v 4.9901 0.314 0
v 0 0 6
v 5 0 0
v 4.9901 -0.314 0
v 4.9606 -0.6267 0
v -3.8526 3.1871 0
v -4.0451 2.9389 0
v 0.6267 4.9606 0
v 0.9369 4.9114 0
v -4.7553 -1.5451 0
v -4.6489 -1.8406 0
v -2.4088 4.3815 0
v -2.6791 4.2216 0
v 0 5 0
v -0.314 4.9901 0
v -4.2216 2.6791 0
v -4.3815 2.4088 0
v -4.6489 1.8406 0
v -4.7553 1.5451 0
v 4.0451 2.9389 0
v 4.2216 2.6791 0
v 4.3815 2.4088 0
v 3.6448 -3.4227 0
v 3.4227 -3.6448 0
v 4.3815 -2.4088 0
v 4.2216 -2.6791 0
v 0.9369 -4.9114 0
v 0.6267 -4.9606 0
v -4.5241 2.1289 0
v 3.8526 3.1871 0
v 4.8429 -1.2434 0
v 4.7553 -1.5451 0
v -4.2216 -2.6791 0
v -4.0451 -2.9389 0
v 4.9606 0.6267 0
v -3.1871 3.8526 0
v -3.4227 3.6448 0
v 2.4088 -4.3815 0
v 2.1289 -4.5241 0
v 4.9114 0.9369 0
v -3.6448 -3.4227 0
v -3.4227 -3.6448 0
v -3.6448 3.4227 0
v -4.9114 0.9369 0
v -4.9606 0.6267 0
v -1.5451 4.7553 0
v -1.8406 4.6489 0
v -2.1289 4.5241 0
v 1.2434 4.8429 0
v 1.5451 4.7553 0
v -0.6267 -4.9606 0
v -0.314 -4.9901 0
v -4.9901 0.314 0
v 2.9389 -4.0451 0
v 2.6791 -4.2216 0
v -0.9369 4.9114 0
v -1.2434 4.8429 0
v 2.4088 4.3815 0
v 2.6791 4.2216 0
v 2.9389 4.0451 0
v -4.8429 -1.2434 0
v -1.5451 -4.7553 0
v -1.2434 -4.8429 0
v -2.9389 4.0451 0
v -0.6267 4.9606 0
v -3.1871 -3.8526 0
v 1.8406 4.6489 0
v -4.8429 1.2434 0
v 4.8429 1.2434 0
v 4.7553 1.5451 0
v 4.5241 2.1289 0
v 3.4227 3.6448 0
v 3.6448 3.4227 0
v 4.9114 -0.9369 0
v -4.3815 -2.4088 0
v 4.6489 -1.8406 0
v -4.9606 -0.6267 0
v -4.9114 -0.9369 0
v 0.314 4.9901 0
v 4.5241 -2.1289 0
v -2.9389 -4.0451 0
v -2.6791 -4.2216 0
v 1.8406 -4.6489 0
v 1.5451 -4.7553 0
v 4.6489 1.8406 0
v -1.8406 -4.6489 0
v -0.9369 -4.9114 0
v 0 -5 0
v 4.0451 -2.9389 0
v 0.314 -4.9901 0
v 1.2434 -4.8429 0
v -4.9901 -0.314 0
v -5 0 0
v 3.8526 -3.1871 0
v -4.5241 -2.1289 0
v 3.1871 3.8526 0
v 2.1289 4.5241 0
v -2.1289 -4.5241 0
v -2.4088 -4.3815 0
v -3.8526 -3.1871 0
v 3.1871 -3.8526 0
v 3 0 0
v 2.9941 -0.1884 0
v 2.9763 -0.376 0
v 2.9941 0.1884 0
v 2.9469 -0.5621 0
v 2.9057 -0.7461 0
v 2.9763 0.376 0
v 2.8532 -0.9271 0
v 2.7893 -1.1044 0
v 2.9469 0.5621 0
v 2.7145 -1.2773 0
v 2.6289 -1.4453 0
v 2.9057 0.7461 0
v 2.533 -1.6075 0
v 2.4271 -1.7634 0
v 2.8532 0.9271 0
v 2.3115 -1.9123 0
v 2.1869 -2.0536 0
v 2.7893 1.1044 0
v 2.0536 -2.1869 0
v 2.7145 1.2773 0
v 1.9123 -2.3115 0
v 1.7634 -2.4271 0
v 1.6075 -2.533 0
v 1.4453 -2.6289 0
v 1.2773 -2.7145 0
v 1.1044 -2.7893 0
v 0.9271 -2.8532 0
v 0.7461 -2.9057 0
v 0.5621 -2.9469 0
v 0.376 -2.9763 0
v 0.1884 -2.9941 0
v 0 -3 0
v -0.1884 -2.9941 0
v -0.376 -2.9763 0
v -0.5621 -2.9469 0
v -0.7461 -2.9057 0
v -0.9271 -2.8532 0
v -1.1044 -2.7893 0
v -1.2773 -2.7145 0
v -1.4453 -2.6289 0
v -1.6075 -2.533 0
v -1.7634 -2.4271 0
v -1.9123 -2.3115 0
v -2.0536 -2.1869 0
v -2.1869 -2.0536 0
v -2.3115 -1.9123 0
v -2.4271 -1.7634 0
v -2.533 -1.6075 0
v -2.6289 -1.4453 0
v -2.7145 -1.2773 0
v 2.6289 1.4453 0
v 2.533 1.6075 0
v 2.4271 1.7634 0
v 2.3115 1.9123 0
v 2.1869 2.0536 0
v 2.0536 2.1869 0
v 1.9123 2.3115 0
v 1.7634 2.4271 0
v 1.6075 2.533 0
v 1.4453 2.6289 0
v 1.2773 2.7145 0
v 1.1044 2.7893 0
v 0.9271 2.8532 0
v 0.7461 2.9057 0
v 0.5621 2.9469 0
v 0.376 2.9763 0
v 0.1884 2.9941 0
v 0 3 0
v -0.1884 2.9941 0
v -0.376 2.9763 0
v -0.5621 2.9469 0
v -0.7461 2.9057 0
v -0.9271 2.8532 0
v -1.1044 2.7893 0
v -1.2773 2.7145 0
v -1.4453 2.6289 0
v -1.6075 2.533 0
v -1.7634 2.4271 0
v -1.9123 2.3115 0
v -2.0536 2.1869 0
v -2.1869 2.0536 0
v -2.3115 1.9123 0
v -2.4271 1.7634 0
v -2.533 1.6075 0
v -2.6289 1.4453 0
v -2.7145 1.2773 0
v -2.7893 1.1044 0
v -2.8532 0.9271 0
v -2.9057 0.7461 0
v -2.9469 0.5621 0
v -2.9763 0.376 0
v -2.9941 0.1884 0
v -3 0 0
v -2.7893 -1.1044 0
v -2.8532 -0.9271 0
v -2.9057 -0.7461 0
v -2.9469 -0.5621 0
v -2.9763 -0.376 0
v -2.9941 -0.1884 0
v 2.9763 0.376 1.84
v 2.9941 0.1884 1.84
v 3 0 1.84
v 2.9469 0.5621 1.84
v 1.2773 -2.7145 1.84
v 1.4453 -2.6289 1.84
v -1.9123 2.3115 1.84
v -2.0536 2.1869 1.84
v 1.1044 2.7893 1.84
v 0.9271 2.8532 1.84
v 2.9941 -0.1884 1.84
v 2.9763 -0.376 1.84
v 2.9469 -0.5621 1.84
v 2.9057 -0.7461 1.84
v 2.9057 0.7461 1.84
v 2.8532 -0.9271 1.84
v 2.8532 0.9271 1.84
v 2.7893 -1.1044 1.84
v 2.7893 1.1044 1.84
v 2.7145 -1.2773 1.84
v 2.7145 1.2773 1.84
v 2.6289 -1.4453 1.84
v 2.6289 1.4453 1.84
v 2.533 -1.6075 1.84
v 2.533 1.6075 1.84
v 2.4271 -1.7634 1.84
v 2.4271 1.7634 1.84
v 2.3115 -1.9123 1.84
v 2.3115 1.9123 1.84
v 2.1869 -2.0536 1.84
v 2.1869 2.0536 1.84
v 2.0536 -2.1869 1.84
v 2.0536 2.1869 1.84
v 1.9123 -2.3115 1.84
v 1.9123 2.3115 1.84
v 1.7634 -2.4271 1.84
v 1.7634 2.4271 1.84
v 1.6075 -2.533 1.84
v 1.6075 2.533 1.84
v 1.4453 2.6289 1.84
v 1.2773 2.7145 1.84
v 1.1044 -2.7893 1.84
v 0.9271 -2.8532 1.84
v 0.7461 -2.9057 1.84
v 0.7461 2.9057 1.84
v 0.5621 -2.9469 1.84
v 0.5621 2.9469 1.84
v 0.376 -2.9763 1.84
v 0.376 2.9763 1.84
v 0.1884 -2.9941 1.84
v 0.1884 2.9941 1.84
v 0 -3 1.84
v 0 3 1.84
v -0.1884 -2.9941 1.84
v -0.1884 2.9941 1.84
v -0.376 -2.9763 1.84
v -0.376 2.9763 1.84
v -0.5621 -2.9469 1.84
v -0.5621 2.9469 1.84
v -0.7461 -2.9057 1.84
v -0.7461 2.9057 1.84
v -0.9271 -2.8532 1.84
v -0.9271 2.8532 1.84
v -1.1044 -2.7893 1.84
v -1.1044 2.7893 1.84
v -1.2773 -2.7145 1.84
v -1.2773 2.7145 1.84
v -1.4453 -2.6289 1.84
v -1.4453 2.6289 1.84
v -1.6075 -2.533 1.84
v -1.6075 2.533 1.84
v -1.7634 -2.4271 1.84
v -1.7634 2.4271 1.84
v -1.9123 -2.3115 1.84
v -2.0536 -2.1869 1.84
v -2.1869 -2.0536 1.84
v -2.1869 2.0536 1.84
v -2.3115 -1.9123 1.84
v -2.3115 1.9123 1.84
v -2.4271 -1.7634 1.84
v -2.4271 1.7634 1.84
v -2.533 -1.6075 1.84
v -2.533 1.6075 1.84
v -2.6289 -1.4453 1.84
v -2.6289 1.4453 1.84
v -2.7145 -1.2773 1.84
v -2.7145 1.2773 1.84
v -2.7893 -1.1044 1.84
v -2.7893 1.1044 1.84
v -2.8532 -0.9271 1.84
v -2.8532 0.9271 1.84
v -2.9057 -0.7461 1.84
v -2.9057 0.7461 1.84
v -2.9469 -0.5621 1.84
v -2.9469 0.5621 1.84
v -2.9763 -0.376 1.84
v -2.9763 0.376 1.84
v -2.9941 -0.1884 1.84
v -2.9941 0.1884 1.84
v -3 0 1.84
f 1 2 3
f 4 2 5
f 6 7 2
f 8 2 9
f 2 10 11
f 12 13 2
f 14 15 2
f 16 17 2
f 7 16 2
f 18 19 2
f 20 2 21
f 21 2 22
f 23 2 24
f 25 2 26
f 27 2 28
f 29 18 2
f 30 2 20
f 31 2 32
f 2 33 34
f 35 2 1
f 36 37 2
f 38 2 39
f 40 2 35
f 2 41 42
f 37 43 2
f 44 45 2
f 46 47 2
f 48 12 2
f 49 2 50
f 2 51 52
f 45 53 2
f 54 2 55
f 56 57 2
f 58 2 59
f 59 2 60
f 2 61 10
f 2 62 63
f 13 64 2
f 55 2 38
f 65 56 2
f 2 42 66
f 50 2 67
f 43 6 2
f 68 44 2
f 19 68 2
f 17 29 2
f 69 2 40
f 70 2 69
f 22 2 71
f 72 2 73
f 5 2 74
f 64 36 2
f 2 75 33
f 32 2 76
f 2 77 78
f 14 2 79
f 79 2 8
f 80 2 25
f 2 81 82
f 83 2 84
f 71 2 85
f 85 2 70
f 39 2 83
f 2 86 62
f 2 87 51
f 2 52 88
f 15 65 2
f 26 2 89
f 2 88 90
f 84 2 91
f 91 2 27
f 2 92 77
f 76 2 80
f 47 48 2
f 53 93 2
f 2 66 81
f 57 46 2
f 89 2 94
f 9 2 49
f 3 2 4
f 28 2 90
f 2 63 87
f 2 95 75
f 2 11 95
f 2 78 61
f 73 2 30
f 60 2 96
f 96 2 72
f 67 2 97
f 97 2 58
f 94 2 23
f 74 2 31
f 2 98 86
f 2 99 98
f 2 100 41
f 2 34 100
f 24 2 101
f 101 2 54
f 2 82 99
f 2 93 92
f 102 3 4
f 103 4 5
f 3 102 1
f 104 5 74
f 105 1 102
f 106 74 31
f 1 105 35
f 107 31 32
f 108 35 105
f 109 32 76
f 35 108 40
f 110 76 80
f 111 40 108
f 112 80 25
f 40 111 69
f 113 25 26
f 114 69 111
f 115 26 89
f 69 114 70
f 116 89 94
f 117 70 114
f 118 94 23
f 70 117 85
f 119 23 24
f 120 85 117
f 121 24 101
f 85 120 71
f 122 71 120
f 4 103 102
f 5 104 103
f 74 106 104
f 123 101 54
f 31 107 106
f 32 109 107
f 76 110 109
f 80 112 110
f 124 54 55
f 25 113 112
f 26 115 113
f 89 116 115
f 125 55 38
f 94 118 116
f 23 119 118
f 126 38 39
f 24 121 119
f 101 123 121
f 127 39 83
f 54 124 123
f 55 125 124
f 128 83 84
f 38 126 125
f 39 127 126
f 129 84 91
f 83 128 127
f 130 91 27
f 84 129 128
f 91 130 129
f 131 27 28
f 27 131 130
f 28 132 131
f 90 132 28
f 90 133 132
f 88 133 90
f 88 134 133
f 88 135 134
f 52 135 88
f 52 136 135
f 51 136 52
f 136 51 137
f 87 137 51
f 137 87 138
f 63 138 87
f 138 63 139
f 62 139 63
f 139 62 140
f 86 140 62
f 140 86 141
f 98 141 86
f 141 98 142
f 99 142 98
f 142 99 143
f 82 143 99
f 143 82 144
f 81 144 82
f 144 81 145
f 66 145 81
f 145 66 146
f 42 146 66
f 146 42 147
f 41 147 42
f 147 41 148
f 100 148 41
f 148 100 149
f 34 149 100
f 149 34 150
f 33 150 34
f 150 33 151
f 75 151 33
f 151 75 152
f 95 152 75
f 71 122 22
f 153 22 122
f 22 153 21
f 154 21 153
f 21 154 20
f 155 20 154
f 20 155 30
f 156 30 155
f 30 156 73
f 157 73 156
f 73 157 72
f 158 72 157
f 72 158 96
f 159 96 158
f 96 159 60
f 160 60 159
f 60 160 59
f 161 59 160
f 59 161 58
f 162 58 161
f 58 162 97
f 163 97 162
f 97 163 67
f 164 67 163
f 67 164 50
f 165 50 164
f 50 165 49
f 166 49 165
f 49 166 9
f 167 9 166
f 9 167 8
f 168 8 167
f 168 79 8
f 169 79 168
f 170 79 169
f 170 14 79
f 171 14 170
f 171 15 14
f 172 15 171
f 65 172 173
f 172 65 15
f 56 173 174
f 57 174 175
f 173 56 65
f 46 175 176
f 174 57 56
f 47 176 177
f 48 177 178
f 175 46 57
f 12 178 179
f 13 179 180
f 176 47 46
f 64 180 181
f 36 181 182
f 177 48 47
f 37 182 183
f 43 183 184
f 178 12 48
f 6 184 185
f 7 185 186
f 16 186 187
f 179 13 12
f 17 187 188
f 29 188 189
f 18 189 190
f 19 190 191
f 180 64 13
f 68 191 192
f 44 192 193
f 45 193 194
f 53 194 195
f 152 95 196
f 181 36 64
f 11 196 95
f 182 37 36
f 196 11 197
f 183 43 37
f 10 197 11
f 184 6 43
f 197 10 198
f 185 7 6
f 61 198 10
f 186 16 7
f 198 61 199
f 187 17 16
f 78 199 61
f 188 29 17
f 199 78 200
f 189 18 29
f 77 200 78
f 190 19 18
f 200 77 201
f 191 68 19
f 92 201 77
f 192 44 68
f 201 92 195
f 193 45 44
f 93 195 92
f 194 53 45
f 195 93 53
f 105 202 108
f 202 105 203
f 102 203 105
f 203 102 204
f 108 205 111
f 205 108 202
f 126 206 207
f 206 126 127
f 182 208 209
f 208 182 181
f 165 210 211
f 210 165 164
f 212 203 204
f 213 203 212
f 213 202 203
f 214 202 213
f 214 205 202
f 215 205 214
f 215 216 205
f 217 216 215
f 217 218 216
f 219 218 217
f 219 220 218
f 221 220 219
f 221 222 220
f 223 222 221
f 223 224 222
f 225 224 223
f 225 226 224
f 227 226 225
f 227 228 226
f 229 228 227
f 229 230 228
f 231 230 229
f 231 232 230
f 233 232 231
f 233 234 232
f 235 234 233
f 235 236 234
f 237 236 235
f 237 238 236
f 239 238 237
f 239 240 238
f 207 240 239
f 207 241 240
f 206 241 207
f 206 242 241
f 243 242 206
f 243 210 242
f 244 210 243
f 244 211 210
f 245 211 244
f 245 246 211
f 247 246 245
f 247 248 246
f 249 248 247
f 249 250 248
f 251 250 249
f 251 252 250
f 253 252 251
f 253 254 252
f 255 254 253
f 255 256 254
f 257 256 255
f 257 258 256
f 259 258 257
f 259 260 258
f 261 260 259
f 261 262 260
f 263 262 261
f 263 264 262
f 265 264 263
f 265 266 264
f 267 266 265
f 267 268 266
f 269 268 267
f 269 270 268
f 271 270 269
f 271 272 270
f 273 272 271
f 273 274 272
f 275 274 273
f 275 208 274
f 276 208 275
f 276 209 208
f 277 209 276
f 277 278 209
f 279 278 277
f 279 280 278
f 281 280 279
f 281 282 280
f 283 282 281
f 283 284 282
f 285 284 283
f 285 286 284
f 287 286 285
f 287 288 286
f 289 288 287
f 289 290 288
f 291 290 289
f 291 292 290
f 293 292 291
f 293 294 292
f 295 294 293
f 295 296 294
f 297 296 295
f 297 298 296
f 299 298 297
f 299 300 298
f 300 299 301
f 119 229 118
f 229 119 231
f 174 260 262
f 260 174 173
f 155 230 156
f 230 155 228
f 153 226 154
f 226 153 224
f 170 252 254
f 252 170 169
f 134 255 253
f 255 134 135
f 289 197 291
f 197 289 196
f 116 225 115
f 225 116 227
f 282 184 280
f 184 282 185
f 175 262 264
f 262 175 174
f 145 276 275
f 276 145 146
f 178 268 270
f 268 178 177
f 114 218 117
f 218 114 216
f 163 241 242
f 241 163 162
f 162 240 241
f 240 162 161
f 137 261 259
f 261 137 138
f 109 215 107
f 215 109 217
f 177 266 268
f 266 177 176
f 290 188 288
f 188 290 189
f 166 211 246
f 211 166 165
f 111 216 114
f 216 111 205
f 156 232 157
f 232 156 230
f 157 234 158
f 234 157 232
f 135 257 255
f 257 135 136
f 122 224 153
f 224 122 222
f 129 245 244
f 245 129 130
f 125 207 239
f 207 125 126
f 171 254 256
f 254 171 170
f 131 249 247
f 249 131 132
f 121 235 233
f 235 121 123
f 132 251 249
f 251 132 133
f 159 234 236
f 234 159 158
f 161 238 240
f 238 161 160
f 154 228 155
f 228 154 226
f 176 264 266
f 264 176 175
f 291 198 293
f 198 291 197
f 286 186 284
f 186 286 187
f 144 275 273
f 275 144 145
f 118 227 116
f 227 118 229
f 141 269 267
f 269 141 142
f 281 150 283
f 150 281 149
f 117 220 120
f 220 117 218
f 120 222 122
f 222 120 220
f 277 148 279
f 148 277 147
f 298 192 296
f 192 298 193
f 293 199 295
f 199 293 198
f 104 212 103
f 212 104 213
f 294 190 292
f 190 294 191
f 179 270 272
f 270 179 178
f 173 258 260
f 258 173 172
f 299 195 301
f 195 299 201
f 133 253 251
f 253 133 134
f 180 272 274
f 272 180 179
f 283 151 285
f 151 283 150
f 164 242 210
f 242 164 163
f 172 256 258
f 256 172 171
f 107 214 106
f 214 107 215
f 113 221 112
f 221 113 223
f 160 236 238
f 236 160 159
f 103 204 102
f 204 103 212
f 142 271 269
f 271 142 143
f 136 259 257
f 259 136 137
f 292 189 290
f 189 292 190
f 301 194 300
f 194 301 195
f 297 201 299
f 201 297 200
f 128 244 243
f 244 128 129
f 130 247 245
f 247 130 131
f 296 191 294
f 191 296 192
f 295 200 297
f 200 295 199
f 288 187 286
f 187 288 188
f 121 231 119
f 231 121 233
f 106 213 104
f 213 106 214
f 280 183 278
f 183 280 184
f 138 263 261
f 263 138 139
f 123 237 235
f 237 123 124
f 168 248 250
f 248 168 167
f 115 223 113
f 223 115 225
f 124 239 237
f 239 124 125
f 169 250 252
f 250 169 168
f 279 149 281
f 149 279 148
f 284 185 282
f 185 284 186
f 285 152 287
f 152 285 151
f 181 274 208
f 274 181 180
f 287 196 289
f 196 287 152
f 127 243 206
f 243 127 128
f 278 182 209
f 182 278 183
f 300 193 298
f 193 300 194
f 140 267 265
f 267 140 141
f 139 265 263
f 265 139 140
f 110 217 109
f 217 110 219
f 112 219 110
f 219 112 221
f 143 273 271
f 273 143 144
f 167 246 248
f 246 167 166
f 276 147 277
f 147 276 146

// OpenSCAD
$fn=100;

tol = 1;
mag_width = 5+tol;
mag_height = 2.68+tol;
wt = 1; // wall thickness
pill_radius = mag_width/2+wt;

bottom_width = 10;
height = 6;
ring_width=1.5;

difference() {
    cylinder(h=height, r1=bottom_width/2, r2=0);
    translate([0,0,-1]) cylinder(h=mag_height/2+1, r=mag_width/2);
}
